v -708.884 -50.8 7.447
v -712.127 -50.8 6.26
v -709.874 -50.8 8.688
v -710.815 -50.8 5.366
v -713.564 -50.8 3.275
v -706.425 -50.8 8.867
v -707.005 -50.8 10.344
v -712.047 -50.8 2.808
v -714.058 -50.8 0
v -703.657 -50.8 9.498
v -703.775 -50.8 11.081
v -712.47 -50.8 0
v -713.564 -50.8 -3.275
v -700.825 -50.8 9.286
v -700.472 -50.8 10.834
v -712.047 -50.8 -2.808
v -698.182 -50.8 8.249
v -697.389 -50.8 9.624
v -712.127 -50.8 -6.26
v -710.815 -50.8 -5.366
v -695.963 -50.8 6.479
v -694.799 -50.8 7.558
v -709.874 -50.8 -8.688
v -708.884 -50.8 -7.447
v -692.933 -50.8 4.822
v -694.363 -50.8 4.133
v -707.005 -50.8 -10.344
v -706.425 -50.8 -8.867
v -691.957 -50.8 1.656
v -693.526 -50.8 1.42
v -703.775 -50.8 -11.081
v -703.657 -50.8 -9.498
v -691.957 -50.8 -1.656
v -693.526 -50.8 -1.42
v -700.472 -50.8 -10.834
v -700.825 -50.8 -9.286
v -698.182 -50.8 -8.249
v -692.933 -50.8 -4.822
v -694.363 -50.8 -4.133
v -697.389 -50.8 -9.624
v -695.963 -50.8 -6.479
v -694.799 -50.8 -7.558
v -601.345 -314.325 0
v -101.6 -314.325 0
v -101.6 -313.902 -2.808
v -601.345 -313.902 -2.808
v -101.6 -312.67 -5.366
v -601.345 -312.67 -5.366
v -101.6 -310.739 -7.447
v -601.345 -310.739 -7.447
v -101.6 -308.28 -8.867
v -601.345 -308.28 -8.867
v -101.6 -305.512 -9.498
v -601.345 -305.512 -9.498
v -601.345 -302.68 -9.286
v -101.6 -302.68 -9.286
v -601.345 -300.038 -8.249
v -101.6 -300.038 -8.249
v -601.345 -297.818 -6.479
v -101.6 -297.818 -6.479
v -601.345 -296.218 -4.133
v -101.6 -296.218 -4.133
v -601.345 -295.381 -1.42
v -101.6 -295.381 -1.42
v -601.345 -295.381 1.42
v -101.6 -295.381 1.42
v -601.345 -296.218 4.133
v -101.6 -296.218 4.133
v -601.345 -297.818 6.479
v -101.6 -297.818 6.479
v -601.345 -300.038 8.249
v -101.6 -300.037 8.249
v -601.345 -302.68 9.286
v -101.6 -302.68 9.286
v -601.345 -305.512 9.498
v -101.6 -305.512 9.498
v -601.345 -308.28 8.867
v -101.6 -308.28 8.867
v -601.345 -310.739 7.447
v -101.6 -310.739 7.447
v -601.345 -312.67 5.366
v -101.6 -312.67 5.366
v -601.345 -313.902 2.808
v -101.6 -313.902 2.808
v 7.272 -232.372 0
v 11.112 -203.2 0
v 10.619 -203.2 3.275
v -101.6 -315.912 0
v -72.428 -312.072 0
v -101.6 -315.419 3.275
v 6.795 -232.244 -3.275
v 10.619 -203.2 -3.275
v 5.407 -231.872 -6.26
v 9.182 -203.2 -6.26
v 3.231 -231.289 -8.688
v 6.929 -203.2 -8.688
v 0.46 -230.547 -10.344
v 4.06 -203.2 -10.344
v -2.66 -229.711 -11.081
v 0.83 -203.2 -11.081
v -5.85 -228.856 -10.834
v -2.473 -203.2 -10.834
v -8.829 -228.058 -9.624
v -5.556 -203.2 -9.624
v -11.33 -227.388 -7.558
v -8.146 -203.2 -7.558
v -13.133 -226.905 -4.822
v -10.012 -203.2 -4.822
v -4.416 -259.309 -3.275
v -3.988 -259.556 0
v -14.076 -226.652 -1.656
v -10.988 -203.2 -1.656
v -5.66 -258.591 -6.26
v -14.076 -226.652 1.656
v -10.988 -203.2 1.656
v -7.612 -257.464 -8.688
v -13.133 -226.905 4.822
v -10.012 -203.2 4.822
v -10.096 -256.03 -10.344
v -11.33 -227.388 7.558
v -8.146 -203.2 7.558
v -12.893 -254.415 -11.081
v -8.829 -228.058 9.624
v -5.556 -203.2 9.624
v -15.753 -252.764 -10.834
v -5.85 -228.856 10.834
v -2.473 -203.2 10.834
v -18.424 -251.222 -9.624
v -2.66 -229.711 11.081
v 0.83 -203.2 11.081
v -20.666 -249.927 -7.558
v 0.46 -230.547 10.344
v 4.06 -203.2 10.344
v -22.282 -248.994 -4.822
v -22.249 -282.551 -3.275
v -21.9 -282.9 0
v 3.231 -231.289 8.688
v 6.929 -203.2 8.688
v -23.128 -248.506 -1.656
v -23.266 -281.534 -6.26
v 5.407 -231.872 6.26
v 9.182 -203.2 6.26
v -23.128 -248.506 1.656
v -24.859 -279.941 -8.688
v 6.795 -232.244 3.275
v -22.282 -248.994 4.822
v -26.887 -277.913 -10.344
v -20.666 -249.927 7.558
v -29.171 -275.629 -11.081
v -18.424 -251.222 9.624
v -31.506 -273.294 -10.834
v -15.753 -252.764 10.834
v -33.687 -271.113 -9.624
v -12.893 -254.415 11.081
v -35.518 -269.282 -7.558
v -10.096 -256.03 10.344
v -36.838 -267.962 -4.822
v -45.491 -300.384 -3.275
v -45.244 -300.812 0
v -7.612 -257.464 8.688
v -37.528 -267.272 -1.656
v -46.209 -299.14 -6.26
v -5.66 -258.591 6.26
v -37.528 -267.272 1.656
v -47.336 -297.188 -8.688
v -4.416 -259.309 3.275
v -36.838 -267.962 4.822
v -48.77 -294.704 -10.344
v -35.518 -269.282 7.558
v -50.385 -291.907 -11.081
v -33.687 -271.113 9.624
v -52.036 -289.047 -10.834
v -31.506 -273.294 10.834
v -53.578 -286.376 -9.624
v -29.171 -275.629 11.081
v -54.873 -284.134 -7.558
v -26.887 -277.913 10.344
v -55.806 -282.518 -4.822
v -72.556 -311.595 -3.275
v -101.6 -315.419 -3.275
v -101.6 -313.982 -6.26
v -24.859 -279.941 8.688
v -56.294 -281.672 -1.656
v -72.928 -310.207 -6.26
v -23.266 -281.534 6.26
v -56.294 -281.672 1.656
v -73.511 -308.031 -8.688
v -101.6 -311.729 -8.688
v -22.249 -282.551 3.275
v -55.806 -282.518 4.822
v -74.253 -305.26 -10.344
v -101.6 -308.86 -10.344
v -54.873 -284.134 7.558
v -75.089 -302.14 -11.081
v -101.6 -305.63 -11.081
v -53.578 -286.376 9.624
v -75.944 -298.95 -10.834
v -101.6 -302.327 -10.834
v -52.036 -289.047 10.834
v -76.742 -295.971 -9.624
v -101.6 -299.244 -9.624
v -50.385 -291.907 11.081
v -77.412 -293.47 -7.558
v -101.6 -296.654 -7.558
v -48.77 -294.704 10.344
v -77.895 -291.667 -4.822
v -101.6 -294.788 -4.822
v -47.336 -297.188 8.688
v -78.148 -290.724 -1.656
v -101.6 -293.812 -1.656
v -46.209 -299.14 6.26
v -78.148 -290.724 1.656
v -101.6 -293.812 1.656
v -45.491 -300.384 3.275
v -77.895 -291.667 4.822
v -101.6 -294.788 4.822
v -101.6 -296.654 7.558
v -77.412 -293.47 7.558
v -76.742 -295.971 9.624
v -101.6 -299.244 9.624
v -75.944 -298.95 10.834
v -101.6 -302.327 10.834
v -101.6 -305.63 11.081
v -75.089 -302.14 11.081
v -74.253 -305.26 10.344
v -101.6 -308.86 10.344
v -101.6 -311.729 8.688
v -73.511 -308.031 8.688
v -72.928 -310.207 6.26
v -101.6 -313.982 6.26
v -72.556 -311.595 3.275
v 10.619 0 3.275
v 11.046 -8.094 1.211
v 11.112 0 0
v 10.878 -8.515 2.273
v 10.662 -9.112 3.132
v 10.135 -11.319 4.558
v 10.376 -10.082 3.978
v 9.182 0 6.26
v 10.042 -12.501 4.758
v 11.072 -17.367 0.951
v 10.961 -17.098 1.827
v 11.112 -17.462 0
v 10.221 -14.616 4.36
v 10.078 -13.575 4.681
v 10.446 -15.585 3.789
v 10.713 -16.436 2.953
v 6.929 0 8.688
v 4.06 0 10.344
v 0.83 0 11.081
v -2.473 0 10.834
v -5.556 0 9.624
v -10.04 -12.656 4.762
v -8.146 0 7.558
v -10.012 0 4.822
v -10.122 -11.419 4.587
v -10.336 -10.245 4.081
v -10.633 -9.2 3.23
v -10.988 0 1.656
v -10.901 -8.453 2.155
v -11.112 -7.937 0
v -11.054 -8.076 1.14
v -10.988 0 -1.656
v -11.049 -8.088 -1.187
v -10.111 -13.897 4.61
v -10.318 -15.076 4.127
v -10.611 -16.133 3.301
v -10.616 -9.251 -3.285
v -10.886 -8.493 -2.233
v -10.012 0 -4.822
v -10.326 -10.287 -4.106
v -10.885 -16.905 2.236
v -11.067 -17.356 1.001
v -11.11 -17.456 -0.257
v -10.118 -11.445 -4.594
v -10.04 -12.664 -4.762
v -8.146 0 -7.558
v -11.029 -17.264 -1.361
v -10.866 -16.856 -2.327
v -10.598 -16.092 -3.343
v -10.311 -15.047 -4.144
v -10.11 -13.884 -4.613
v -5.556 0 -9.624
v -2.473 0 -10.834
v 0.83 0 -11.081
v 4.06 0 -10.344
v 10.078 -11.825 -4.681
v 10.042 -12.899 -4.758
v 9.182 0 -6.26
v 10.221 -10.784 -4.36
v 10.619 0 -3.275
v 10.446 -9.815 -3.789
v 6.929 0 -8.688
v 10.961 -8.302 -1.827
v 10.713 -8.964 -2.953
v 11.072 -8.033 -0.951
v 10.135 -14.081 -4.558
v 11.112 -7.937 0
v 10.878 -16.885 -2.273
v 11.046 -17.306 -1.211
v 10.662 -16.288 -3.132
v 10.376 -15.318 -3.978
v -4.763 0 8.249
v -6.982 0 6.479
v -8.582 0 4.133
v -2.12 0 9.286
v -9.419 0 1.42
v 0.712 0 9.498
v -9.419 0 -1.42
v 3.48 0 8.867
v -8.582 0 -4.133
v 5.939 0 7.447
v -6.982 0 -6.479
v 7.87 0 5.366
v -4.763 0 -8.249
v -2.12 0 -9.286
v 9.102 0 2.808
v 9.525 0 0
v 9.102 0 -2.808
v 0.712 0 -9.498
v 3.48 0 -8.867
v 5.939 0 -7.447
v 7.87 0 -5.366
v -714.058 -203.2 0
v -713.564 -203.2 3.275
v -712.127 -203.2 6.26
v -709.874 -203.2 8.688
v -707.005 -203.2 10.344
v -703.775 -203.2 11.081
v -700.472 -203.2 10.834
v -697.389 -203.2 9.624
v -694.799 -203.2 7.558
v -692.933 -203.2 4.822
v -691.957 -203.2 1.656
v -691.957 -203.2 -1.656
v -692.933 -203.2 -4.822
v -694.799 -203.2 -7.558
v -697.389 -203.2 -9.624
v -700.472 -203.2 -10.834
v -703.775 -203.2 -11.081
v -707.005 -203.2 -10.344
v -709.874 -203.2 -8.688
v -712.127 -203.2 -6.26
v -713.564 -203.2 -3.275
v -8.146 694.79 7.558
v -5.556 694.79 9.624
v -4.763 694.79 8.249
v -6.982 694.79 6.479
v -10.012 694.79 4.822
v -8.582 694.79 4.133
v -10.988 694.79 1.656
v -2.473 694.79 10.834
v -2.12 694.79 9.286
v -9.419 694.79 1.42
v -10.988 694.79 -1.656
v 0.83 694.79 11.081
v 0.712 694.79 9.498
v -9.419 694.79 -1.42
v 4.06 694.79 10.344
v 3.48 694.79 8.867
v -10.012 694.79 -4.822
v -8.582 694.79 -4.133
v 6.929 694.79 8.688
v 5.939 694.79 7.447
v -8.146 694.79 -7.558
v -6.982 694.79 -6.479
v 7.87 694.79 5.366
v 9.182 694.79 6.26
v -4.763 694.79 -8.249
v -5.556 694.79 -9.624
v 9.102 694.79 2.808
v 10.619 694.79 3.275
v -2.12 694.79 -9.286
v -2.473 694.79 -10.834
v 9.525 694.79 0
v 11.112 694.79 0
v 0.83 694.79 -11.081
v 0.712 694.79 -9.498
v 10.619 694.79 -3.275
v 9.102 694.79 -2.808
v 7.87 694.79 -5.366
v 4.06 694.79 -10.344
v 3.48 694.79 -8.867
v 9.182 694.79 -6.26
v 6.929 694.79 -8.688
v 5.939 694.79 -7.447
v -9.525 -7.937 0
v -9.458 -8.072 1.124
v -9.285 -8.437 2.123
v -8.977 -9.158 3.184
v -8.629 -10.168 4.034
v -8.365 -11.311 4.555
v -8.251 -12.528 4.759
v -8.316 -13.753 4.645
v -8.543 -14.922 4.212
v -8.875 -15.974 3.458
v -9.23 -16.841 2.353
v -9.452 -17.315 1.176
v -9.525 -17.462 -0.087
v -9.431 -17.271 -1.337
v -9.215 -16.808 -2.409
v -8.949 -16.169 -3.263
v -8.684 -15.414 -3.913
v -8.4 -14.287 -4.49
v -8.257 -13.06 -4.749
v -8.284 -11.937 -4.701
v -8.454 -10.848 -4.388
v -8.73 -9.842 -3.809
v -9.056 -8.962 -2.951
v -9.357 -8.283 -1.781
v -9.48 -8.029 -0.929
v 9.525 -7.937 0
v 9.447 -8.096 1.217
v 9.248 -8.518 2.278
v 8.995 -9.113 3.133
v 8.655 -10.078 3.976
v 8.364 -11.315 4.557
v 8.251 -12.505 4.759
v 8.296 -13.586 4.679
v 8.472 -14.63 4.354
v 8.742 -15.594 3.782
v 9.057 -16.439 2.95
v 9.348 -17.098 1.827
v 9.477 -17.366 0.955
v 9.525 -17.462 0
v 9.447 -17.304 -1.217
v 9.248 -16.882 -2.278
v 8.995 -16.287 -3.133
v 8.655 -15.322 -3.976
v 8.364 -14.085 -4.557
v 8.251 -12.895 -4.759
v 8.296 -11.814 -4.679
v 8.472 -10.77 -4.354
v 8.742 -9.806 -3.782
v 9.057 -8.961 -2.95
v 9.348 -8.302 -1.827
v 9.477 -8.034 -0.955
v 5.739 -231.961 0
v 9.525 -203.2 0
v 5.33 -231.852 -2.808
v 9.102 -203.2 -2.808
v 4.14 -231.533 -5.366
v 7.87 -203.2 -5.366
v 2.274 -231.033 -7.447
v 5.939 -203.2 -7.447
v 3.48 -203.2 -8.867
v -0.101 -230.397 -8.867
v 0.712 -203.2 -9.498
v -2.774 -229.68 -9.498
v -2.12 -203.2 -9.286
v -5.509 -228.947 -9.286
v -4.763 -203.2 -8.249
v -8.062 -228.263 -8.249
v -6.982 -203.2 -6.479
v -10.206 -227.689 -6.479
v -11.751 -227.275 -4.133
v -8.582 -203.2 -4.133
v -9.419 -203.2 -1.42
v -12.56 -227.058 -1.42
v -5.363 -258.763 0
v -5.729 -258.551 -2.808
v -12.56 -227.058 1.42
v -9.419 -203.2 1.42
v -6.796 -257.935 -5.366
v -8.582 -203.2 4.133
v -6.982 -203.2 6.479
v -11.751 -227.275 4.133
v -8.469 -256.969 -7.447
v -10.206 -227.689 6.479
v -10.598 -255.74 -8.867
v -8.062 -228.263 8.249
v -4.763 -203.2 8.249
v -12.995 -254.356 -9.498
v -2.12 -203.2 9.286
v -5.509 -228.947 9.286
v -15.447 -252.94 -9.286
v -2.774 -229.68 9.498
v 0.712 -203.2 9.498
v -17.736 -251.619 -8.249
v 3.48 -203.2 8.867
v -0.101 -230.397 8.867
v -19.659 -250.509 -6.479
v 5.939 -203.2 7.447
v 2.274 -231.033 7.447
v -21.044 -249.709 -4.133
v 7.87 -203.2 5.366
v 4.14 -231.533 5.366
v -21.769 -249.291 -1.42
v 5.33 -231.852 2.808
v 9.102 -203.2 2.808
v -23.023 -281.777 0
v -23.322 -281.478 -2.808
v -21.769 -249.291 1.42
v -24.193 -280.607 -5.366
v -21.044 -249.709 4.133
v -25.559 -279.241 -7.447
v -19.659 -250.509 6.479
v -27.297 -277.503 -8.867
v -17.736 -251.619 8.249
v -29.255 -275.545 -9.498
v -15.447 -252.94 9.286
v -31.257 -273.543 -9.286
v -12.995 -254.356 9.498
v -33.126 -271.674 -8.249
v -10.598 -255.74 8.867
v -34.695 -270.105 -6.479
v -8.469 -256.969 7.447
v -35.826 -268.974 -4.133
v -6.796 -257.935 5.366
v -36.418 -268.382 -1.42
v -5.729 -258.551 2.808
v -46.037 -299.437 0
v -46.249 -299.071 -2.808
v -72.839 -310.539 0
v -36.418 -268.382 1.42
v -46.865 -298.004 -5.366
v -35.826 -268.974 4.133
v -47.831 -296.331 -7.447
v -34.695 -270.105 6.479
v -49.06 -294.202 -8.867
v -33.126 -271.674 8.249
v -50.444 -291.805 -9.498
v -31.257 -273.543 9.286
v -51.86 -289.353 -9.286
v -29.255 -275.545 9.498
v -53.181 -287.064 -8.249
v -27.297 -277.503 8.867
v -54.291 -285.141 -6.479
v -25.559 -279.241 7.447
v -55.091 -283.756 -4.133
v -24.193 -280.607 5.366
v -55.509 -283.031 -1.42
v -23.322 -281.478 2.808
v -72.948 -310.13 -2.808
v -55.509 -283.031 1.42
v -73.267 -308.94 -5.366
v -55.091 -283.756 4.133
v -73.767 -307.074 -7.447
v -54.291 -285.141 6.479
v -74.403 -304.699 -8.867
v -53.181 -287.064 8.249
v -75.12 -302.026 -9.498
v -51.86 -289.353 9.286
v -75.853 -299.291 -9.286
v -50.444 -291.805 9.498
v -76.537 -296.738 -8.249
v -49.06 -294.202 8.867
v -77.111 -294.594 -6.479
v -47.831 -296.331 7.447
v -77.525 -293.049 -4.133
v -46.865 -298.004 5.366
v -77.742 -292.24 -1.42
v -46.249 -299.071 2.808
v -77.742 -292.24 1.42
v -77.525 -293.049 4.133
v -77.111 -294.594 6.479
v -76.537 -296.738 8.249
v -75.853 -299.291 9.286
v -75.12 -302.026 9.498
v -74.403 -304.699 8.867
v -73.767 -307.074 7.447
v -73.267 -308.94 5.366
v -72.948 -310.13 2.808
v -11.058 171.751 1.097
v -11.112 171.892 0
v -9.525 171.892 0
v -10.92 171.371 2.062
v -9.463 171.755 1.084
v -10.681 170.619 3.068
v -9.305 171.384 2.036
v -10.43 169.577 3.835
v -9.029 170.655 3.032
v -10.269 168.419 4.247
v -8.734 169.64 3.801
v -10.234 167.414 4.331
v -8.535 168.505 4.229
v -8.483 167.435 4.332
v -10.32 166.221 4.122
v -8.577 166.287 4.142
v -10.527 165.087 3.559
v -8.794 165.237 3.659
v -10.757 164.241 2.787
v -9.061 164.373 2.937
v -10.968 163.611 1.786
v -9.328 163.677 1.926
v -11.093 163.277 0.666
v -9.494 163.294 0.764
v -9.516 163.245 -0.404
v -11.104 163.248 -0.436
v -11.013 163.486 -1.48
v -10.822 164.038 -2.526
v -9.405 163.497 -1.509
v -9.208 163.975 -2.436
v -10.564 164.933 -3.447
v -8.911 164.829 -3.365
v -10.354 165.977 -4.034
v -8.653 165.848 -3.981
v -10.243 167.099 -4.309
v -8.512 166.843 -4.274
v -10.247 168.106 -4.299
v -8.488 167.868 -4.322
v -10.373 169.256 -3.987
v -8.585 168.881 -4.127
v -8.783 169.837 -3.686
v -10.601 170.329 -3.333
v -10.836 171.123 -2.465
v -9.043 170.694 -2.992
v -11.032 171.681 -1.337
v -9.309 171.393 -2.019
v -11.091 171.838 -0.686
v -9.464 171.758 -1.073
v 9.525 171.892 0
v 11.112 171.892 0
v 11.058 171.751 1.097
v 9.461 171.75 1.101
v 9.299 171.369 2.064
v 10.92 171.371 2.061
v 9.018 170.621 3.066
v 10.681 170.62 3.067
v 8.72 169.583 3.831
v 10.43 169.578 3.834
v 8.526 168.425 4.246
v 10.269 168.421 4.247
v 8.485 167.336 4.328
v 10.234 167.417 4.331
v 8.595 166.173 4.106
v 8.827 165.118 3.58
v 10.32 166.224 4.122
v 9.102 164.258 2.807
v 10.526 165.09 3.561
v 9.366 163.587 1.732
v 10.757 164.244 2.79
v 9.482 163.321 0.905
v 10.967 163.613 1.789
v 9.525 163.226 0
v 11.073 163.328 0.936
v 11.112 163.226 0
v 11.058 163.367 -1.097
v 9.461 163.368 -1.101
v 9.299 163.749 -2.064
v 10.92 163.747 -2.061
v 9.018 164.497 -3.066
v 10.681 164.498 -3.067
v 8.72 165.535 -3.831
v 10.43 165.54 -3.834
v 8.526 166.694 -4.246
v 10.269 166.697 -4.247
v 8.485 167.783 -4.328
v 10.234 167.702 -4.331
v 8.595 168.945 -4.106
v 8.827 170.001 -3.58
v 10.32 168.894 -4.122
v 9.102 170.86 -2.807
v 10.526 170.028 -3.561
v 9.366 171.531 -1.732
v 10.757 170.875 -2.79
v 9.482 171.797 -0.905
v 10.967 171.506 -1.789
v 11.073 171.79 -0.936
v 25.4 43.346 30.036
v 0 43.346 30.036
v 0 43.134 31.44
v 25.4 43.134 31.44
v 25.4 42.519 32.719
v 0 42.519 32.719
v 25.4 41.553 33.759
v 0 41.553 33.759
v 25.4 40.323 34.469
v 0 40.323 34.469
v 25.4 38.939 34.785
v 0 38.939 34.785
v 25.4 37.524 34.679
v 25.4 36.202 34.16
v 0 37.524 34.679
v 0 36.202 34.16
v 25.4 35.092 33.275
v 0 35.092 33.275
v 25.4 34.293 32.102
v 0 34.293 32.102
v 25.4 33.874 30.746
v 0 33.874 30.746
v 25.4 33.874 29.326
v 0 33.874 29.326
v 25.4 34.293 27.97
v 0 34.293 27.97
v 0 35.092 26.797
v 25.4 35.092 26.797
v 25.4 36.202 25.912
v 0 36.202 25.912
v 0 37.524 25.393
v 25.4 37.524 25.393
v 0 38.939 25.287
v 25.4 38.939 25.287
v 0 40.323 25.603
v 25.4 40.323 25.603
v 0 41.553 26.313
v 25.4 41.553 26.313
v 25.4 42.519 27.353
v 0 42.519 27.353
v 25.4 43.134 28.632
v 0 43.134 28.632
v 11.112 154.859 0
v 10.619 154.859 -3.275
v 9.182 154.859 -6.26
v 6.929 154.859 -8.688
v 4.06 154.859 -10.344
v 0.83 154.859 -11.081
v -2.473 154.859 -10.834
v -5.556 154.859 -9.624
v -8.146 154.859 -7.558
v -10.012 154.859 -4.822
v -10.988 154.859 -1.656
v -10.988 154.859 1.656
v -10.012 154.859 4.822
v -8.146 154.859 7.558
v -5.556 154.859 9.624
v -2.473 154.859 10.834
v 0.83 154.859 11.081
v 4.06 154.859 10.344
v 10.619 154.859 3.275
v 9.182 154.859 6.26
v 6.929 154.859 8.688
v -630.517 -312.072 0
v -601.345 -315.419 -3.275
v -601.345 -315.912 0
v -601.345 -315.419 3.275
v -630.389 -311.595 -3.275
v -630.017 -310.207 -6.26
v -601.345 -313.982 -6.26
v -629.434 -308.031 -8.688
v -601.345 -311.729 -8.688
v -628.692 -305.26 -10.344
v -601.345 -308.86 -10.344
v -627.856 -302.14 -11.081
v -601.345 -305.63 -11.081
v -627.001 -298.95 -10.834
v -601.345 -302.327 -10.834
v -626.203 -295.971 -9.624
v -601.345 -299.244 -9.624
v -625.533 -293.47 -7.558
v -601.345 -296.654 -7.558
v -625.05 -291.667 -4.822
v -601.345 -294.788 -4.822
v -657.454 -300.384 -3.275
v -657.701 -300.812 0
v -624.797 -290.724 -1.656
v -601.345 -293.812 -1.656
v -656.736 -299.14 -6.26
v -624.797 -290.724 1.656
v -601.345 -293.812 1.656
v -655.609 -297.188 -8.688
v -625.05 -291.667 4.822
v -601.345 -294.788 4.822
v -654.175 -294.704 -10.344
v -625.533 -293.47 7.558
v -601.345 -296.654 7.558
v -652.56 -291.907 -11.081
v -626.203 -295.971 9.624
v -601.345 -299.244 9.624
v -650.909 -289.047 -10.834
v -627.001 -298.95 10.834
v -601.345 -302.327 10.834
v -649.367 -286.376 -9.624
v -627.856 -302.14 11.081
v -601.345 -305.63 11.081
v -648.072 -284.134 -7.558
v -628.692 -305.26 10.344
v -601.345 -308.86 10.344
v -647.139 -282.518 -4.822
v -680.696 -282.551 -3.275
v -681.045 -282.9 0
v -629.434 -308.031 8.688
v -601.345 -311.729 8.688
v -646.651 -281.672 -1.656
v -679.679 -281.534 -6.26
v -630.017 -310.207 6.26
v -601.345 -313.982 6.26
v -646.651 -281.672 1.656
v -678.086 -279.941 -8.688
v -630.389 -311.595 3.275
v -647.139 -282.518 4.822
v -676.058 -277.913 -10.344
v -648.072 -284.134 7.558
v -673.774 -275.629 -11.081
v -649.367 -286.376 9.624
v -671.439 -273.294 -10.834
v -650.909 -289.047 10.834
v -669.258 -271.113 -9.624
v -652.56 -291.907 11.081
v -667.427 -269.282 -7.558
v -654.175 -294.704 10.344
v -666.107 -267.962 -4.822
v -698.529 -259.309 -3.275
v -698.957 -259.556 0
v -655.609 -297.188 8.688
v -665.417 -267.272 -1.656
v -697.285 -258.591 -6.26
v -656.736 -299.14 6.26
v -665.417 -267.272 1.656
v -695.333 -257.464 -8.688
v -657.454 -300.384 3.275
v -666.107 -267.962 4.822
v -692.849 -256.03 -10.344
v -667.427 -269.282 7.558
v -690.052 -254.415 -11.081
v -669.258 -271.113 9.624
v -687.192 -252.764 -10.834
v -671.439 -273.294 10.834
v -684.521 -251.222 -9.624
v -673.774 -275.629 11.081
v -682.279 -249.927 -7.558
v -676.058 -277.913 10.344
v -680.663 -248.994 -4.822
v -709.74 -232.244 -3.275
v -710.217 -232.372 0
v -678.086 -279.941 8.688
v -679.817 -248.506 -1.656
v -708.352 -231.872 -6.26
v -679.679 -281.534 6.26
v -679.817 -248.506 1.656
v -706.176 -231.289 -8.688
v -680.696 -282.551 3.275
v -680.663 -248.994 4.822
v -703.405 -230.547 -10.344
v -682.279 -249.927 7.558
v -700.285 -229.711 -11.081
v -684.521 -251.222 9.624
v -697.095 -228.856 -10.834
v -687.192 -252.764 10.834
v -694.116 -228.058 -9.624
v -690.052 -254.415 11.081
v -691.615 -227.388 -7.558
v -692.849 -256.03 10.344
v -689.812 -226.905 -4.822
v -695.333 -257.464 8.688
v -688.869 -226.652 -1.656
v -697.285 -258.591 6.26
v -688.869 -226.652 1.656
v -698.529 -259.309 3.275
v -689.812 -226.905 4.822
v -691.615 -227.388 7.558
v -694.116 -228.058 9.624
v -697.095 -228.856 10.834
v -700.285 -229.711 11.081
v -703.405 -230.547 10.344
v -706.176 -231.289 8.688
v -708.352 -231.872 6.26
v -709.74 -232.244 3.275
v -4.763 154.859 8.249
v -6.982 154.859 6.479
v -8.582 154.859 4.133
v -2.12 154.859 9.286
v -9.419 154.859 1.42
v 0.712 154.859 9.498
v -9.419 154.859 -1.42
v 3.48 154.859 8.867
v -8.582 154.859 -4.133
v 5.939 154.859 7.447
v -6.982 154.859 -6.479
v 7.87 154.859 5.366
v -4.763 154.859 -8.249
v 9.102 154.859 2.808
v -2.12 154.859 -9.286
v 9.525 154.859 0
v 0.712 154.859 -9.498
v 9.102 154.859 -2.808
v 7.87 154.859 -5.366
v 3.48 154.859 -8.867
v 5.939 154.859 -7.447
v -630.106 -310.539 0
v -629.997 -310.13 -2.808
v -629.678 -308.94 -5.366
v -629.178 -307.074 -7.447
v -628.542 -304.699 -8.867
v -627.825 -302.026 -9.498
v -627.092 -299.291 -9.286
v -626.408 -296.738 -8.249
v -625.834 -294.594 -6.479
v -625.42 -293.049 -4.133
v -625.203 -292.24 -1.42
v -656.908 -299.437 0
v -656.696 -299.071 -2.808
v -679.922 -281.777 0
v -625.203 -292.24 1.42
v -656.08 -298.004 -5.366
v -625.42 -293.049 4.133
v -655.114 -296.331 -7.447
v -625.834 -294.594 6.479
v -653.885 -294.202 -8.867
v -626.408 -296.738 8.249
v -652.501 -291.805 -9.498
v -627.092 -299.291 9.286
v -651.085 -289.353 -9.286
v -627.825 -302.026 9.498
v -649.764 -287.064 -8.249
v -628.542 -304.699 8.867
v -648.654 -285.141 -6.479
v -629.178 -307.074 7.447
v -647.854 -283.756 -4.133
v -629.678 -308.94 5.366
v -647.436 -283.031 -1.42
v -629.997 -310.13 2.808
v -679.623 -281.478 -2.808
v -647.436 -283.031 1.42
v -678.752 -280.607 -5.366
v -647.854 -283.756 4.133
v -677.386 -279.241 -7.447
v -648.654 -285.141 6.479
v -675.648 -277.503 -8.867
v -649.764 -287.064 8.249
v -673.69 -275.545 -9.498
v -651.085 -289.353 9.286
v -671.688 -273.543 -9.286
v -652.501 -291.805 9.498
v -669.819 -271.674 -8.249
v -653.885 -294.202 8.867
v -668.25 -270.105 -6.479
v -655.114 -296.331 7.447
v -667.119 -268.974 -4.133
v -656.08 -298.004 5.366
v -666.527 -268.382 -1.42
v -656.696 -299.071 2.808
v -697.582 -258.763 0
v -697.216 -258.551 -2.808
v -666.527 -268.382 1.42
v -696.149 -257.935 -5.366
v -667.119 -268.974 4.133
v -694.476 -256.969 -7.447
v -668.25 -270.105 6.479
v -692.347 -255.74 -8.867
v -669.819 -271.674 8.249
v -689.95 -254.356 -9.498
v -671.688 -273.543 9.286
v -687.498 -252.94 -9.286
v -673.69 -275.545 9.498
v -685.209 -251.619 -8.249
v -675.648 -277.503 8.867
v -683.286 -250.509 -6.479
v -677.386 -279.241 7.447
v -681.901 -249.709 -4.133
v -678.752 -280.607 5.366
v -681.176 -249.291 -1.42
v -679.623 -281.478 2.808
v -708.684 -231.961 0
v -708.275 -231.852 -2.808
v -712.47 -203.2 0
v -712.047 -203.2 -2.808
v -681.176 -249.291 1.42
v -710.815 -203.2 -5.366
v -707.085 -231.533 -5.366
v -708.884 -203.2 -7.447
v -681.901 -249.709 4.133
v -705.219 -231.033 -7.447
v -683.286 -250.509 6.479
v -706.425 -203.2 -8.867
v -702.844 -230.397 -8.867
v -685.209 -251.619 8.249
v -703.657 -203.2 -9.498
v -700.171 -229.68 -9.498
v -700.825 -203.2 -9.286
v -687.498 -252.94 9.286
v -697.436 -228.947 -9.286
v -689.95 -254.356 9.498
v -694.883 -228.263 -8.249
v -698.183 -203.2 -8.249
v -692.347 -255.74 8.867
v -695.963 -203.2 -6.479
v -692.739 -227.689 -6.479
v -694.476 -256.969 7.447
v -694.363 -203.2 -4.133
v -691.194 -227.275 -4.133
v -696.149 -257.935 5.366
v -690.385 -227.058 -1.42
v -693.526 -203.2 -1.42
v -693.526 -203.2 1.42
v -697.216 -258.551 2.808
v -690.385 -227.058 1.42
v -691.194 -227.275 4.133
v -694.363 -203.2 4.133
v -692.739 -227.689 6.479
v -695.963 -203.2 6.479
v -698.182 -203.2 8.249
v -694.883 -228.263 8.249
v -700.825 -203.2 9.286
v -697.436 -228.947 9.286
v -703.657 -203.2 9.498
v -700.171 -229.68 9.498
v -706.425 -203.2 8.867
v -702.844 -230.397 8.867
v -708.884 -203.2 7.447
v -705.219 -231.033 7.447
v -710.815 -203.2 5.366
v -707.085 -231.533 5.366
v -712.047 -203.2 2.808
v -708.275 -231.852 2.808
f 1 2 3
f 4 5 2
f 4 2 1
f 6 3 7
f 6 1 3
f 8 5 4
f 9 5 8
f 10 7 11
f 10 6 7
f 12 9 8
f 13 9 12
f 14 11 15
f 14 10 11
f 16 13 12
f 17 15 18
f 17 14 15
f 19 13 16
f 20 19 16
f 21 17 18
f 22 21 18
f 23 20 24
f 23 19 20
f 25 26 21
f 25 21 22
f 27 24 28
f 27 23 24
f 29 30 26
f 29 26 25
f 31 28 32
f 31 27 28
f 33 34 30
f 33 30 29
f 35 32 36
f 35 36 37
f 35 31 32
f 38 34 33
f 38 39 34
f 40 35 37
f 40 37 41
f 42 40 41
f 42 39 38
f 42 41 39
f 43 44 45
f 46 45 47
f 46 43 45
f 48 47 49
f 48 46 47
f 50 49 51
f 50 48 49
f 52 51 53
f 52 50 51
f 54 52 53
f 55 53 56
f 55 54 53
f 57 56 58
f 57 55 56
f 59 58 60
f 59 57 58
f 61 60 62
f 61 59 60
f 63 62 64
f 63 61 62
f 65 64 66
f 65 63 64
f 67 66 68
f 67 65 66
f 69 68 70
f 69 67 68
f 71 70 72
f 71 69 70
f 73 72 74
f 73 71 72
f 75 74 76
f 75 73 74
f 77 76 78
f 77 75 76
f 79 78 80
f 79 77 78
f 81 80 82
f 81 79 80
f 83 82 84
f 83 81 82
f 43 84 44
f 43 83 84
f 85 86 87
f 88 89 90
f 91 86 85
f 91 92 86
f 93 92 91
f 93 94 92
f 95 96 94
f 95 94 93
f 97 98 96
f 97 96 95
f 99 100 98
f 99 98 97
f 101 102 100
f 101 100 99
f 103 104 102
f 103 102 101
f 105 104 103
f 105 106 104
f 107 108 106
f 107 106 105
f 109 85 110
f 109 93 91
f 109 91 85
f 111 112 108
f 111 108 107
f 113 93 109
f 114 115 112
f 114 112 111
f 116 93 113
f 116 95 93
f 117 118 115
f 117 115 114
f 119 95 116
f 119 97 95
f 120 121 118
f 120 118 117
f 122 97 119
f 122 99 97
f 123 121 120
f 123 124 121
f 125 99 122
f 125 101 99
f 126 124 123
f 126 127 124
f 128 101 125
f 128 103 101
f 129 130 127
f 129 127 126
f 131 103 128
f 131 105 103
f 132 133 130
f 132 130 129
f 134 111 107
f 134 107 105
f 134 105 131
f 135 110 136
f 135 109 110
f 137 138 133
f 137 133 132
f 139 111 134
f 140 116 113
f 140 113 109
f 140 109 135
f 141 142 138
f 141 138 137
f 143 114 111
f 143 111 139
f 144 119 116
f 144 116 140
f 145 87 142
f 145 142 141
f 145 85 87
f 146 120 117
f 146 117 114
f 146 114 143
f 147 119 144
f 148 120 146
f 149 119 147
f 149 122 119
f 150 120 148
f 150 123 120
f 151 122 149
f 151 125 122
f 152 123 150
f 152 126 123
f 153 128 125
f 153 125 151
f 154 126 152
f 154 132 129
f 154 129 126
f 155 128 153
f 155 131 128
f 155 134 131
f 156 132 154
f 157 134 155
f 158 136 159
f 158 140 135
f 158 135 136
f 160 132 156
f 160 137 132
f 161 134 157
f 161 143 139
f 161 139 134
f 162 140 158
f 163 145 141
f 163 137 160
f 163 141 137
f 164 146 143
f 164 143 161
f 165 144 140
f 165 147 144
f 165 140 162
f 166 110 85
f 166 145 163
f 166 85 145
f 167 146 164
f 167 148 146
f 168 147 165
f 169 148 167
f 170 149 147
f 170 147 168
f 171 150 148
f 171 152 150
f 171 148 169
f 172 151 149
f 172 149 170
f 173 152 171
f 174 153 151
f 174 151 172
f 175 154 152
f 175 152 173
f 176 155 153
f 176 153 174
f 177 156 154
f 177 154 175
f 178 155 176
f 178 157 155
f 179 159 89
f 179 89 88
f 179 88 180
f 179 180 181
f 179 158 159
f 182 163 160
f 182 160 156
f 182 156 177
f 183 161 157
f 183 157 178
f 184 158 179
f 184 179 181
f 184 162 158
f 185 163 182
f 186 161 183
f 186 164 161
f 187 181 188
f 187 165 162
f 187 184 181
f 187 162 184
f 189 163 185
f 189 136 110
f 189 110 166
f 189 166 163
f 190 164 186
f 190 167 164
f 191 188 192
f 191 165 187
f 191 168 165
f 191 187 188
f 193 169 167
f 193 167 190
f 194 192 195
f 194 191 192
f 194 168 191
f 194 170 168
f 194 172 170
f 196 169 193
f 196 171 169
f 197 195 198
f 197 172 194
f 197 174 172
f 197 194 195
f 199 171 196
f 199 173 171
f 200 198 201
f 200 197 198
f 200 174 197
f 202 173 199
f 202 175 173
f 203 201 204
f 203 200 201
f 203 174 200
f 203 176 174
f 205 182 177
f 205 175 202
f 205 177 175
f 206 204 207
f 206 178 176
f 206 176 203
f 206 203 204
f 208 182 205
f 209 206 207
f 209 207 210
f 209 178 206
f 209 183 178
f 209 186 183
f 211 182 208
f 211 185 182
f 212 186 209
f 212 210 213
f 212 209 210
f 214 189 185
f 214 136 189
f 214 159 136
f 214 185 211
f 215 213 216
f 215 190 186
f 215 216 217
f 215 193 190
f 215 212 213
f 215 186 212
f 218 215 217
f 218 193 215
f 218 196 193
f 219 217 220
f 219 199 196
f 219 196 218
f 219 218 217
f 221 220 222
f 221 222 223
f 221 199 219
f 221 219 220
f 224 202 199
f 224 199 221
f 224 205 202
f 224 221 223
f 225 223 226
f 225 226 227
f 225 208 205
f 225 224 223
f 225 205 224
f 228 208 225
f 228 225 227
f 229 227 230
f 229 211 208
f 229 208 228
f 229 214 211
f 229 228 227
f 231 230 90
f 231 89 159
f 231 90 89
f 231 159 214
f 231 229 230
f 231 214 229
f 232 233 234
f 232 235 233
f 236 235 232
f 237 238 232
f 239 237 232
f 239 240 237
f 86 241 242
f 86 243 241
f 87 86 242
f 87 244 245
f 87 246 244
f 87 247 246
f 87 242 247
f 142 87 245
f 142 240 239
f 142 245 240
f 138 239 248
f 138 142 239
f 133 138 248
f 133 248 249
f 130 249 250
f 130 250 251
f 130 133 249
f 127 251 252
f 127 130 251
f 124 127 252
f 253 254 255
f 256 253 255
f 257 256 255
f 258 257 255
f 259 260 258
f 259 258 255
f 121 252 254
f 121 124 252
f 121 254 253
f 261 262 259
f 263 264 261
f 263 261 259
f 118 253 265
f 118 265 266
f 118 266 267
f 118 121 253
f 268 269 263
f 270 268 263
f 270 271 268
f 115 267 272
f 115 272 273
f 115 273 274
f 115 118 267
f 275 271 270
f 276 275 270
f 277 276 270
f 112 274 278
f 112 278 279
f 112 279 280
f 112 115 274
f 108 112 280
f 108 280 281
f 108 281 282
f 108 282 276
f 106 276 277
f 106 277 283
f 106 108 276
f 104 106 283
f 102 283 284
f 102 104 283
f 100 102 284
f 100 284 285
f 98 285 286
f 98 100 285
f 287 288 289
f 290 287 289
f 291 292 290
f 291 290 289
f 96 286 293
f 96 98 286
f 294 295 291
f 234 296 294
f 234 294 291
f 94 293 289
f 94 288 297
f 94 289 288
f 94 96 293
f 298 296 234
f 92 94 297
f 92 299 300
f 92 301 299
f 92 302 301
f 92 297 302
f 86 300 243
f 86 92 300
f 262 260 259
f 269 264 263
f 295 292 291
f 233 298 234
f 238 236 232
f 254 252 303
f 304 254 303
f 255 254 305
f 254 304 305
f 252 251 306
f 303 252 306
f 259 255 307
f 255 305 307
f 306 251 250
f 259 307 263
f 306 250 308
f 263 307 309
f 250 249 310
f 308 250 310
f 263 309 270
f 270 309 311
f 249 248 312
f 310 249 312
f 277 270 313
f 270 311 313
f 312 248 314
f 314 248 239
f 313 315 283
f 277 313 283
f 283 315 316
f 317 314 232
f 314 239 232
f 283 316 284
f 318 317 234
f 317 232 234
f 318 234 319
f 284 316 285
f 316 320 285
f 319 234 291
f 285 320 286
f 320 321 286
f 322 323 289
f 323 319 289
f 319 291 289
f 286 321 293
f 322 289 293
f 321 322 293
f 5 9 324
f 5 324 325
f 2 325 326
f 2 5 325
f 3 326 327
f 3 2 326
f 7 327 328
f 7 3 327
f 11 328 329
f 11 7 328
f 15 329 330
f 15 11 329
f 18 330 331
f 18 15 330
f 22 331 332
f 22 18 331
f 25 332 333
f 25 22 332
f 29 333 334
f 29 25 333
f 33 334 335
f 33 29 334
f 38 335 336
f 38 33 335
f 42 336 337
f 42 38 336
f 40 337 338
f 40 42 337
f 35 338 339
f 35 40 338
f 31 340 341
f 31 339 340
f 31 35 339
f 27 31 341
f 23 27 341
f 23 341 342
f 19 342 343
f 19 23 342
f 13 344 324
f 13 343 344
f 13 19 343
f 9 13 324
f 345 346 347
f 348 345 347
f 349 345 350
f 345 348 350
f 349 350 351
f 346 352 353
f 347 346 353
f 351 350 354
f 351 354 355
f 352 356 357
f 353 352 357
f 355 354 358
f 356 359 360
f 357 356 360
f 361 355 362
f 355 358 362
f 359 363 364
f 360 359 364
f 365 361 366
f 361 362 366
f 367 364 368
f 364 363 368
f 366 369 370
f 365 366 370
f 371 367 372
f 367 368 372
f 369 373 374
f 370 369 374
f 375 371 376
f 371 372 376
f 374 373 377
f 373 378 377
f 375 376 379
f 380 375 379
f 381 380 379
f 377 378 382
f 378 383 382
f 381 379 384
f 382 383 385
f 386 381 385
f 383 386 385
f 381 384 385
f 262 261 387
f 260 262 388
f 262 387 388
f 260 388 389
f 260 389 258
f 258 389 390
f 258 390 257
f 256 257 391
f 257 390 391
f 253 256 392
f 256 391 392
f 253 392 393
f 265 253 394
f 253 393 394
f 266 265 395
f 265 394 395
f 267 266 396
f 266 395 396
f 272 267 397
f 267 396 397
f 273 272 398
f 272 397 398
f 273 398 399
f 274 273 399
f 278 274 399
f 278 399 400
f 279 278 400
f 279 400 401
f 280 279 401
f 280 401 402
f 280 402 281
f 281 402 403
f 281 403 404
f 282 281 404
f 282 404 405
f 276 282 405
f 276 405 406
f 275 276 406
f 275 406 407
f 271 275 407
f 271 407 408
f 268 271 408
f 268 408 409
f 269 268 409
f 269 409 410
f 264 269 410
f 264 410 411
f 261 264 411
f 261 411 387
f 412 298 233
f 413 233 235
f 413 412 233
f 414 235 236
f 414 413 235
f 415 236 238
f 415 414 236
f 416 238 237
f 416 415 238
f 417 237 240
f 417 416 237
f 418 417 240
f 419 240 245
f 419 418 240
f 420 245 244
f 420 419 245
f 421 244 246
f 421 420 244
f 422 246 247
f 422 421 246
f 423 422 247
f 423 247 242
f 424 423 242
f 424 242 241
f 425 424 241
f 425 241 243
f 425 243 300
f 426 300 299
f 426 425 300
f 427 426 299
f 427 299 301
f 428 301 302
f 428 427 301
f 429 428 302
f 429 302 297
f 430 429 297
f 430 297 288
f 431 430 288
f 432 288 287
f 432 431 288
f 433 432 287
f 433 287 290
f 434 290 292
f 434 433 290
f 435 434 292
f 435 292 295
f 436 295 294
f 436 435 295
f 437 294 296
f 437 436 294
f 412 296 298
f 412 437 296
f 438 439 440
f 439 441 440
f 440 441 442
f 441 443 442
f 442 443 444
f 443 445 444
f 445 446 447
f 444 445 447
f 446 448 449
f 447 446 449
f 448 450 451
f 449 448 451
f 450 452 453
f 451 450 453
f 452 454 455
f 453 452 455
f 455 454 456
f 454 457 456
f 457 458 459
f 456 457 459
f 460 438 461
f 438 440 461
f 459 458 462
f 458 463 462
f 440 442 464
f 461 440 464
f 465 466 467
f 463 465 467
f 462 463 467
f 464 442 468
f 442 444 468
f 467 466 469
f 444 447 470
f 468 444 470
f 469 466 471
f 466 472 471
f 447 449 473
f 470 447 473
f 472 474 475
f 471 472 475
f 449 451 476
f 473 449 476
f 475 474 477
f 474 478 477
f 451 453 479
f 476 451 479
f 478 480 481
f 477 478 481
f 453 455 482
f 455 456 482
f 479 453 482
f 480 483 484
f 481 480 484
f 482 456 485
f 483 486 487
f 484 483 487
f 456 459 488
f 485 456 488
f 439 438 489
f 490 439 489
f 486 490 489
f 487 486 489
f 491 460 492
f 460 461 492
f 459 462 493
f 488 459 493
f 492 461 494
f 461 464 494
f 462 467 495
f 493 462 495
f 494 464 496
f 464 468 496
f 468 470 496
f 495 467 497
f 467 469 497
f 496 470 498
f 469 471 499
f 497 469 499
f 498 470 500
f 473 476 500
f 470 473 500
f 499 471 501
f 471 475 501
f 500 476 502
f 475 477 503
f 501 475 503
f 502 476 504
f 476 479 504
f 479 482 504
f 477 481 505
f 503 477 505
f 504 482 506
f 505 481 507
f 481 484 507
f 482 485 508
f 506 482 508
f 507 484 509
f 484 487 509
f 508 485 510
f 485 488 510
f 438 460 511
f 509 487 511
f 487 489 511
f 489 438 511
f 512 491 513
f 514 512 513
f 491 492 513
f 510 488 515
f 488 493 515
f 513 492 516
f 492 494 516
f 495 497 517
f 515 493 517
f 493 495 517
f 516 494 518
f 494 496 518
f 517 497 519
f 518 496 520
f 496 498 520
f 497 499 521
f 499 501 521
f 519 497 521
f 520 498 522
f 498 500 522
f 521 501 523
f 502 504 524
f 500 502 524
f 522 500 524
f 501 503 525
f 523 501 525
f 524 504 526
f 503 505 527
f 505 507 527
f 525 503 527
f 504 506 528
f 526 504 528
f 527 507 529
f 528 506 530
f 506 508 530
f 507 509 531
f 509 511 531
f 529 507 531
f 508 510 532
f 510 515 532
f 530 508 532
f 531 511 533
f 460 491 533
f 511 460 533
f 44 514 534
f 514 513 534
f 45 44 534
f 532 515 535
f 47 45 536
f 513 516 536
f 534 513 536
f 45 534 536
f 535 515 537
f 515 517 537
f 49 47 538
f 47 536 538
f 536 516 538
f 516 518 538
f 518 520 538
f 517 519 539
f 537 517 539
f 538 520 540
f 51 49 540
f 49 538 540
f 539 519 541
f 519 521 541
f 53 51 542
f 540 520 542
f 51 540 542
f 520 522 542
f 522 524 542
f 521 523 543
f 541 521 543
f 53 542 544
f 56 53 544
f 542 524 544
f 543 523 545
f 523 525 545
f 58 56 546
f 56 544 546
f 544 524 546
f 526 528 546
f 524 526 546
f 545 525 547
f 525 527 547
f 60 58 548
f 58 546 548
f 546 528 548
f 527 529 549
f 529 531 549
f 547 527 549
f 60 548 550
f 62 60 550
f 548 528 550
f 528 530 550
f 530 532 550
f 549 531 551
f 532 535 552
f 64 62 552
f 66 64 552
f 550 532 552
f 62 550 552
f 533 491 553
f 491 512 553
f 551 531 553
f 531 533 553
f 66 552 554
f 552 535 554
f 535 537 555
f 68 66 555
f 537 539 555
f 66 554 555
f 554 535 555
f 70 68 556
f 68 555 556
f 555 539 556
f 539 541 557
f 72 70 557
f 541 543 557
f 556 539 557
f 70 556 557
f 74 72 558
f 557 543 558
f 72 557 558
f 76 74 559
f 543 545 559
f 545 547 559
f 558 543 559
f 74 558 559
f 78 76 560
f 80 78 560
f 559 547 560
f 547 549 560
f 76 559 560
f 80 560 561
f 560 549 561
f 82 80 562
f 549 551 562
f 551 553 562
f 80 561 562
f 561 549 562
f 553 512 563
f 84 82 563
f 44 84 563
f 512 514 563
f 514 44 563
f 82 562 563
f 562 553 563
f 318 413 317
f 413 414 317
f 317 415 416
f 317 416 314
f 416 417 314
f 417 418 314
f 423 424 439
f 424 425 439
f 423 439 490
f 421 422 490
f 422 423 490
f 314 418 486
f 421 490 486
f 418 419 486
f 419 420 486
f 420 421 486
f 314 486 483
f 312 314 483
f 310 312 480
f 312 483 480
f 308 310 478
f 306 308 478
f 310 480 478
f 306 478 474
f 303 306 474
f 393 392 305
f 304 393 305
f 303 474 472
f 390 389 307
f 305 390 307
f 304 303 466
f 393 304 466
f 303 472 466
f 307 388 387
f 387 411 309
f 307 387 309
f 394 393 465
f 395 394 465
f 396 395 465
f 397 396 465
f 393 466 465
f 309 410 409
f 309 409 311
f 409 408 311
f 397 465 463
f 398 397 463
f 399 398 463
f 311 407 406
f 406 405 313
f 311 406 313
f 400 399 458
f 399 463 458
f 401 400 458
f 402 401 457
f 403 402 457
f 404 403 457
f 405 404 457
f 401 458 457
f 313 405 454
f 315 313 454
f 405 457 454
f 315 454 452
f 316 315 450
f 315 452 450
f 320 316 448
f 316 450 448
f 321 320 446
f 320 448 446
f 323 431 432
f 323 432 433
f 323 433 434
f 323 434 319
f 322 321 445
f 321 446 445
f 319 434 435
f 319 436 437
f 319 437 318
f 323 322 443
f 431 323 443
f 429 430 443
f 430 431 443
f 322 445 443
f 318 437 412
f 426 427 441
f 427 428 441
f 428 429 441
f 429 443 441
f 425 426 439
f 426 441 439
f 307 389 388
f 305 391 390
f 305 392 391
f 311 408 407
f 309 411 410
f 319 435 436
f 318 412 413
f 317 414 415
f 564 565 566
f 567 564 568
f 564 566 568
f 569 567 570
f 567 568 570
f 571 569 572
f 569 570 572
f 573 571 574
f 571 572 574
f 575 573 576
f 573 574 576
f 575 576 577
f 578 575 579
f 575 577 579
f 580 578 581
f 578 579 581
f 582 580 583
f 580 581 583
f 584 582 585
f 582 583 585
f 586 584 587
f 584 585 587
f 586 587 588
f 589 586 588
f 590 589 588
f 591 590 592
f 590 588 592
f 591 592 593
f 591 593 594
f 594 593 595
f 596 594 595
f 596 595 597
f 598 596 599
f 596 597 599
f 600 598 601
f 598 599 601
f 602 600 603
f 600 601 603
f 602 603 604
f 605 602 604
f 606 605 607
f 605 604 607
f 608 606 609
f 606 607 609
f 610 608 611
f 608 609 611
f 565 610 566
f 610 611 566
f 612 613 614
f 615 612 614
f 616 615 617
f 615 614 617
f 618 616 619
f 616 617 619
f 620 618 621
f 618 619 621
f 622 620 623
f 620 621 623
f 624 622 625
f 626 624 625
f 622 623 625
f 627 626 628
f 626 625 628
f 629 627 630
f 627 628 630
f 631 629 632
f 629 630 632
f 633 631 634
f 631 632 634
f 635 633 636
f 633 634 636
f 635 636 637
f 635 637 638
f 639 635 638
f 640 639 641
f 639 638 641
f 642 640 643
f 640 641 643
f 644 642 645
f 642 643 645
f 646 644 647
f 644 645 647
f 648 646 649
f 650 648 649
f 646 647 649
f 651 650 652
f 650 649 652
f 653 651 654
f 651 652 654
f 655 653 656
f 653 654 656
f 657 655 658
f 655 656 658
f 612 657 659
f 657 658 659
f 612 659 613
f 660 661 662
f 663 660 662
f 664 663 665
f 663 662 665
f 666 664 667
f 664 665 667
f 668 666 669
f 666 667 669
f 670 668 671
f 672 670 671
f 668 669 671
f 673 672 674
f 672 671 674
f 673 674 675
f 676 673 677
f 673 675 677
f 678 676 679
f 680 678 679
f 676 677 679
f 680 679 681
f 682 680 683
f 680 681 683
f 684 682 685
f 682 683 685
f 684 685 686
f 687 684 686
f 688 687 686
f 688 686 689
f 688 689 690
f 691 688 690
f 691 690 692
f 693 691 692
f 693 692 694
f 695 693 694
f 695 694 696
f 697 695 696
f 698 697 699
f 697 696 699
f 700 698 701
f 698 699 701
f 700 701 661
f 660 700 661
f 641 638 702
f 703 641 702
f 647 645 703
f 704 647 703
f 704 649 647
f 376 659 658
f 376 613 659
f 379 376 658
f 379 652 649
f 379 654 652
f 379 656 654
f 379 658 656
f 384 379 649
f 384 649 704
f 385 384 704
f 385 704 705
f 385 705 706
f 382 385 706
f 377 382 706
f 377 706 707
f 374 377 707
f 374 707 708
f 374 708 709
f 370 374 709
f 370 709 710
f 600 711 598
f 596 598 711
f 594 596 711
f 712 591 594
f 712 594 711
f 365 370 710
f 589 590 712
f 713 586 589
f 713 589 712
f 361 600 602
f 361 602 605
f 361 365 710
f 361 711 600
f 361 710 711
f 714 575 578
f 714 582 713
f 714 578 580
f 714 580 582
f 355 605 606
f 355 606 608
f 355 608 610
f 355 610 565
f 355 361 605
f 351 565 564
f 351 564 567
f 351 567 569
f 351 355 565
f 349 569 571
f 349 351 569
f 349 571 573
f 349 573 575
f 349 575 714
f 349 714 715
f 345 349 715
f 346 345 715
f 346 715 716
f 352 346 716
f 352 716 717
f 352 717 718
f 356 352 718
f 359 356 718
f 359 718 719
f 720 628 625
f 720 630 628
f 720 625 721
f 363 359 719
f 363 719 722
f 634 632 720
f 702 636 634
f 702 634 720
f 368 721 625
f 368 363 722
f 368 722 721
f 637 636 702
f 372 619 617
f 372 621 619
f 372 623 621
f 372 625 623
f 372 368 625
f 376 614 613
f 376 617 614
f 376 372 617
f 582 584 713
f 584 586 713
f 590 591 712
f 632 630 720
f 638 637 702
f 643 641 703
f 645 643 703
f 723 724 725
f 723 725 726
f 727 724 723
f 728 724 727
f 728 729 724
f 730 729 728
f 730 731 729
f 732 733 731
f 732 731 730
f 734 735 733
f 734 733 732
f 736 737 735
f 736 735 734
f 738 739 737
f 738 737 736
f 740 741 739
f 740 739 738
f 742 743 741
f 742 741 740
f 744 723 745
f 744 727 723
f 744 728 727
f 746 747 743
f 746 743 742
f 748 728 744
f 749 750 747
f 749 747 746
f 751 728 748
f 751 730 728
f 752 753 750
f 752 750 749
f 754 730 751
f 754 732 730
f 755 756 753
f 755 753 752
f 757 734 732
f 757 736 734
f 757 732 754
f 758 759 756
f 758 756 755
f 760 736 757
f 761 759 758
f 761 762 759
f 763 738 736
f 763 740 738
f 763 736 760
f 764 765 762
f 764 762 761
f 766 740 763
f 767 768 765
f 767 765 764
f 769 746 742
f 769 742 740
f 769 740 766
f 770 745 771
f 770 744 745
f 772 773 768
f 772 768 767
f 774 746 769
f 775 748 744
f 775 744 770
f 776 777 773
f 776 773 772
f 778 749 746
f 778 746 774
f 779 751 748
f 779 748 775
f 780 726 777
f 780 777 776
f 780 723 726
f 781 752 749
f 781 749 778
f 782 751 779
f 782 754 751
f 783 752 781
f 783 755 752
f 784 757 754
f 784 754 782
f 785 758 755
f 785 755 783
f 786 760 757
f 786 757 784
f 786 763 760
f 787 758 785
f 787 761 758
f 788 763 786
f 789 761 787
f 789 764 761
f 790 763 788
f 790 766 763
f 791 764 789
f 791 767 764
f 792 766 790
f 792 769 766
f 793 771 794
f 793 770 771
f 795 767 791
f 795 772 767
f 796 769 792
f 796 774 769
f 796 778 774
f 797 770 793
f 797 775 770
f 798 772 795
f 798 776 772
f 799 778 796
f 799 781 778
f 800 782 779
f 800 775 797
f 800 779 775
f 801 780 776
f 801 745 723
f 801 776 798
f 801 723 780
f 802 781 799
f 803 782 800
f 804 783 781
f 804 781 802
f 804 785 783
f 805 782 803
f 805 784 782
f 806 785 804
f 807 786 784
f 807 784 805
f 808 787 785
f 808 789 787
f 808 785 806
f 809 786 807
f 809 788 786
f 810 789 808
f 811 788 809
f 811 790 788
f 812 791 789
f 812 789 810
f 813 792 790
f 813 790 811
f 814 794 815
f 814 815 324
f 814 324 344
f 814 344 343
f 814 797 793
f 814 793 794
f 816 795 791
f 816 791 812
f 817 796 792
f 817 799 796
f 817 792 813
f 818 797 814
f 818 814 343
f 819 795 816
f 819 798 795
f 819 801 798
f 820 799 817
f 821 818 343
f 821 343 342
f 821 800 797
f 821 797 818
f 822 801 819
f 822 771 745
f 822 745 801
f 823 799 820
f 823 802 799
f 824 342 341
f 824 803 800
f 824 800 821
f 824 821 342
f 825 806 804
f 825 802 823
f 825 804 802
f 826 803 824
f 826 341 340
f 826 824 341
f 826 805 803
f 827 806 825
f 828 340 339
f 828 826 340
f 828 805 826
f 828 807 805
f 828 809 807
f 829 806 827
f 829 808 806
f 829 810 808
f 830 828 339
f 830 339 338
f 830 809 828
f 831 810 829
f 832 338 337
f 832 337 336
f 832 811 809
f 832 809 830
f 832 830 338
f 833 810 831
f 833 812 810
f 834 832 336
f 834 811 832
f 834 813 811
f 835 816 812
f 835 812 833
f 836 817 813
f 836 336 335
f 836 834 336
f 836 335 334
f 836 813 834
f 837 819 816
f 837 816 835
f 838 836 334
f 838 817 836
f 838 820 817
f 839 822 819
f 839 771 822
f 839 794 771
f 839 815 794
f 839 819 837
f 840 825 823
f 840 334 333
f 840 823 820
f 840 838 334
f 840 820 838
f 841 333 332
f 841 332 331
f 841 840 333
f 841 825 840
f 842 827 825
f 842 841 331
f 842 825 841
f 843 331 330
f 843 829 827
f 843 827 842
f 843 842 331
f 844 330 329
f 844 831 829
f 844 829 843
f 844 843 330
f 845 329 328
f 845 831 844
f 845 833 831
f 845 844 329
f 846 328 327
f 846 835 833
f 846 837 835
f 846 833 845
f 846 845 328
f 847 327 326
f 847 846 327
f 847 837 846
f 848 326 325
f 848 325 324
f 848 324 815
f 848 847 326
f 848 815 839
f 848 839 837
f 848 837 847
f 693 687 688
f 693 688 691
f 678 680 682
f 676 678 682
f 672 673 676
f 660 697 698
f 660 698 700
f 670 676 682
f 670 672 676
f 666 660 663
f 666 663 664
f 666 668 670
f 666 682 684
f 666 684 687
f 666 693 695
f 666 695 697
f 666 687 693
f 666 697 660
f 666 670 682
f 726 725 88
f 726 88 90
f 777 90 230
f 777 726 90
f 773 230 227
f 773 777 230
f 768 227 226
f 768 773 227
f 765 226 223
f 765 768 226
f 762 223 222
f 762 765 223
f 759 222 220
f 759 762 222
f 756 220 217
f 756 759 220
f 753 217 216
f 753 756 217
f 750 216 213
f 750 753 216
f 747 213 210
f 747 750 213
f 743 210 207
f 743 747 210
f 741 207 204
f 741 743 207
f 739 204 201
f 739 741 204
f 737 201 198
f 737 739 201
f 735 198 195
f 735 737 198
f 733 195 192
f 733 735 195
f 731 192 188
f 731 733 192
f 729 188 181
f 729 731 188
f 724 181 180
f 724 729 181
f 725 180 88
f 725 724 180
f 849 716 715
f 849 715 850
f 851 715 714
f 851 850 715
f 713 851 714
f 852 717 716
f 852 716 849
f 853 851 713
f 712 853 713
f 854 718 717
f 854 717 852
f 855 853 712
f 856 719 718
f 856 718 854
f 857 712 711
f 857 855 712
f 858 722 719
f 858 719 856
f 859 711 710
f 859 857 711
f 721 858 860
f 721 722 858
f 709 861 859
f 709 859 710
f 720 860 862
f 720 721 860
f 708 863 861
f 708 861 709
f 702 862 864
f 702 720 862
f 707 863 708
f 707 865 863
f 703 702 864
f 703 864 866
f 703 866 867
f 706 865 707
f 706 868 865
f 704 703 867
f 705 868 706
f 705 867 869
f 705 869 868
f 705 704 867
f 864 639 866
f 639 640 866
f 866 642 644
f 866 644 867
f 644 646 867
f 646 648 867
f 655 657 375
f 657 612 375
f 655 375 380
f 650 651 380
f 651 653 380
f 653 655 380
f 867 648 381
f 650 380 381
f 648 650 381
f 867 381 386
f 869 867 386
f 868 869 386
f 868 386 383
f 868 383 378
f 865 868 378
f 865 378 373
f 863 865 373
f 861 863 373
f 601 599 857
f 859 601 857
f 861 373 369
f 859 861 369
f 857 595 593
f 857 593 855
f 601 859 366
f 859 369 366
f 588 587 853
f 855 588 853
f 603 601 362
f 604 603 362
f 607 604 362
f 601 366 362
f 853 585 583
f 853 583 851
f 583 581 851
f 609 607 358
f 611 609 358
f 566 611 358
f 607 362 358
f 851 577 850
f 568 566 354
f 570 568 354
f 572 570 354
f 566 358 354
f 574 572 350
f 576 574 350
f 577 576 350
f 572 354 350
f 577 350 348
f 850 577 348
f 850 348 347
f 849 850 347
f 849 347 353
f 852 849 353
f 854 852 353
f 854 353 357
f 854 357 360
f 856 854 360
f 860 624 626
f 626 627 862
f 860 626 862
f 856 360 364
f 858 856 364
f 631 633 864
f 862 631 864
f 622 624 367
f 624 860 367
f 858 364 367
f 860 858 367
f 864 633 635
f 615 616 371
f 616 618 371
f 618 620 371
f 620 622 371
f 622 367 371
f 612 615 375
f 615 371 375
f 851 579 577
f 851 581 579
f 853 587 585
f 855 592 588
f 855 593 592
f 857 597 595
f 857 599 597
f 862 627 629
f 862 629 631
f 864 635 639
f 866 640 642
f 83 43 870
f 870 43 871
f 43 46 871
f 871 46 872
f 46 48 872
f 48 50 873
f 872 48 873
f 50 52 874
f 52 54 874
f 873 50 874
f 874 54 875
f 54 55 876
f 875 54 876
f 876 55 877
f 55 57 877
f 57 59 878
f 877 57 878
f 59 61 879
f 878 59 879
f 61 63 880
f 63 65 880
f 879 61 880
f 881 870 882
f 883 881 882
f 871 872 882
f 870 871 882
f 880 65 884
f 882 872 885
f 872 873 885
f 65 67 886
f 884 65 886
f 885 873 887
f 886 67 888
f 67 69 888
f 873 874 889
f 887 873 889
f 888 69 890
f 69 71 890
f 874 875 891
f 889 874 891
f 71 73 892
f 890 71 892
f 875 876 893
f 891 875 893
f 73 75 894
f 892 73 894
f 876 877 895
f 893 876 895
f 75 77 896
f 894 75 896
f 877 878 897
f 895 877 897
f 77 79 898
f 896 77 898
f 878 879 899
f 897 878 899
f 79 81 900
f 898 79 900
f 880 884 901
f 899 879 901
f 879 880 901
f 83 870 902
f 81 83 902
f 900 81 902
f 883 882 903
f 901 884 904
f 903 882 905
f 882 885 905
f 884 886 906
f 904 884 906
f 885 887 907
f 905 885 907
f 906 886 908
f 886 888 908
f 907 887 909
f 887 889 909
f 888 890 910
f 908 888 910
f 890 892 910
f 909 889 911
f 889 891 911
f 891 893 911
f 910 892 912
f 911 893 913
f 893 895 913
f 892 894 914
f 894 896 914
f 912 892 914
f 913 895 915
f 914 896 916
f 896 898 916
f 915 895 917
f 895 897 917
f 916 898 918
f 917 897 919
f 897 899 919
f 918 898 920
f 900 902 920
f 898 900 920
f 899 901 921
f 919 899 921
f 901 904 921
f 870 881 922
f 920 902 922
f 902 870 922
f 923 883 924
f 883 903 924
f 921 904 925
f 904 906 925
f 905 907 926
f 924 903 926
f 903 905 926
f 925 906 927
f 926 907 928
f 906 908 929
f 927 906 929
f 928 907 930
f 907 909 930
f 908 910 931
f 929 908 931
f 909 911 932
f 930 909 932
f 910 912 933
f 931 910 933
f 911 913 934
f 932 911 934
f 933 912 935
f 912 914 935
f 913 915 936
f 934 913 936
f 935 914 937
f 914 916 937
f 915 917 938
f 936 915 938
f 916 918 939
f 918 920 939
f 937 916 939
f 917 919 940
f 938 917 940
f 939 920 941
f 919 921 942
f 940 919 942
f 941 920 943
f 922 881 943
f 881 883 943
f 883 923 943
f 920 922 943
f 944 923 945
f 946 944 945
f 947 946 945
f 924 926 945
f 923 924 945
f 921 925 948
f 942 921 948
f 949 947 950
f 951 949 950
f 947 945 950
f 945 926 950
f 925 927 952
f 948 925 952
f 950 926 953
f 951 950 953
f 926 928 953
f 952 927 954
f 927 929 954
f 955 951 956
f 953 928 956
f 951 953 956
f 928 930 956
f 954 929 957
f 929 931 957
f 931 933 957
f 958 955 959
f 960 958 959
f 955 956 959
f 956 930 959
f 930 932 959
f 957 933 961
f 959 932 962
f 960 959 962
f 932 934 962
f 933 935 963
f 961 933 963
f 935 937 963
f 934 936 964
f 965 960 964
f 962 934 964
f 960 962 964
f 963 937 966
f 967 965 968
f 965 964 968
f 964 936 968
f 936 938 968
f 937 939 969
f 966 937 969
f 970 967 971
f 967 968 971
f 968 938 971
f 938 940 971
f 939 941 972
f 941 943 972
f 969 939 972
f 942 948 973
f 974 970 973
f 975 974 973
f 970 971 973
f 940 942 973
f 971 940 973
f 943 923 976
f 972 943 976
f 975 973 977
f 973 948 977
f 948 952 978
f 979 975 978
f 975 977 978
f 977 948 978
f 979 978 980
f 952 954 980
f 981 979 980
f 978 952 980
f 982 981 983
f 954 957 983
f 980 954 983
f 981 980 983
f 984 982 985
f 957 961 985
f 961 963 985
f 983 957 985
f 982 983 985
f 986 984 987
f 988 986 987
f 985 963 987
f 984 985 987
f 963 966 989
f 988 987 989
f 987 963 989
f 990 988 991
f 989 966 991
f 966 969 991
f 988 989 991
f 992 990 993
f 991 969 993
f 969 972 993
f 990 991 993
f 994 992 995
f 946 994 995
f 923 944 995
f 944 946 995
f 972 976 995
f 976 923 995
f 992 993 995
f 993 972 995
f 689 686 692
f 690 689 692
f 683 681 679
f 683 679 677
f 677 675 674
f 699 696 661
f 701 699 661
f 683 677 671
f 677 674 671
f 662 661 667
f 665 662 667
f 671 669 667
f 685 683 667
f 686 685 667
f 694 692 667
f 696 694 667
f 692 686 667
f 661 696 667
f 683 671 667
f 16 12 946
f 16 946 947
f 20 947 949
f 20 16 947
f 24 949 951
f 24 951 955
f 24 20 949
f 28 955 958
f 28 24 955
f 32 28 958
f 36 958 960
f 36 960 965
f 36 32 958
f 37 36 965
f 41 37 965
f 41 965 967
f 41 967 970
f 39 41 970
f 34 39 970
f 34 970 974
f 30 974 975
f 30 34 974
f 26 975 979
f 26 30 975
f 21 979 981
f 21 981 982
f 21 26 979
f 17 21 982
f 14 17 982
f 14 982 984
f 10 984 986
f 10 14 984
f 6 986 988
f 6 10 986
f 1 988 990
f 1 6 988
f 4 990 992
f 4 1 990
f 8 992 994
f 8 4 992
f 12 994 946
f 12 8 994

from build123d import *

# Parameters (mm, degrees)
F1_R      = 11.1125
F1_R_2    = 9.525
F5_R      = 11.1125
F5_R_2    = 9.525
F7_R      = 4.7625
F7_R_2    = 4.333305
F8_DEPTH  = 12.7
F9_R      = 4.7625
F10_DEPTH = 25.4


with BuildPart() as f2:
    # F2: sweep along a path in F0
    with BuildLine(Plane.XY) as f2_path:
        Line((0, 0), (0, -203.2))
        ThreePointArc((0, -203.2), (-29.757951, -275.042049), (-101.6, -304.8))
        Line((-101.6, -304.8), (-601.345, -304.8))
        ThreePointArc((-601.345, -304.8), (-673.187049, -275.042049), (-702.945, -203.2))
        Line((-702.945, -203.2), (-702.945, -50.8))
    # F1 (on Front) → F2 (sweep)
    with BuildSketch(Plane.XZ):
        Circle(F1_R)
        Circle(F1_R_2, mode=Mode.SUBTRACT)
    sweep(path=f2_path.line)


with BuildPart() as f6:
    # F6: sweep along a path in F3
    with BuildLine(Plane.XY) as f6_path:
        Line((0, 154.859155), (0, 694.789588))
    # F5 (on plane+point) → F6 (sweep)
    with BuildSketch(Plane.XZ.offset(-154.859155)):
        Circle(F5_R)
        Circle(F5_R_2, mode=Mode.SUBTRACT)
    sweep(path=f6_path.line)


with BuildPart() as f8_tool:
    # F7 (on Right) → F8 (new body, symmetric)
    with BuildSketch(Plane.YZ):
        with Locations((-12.7, 0)):
            Circle(F7_R)
        with Locations((167.559155, 0)):
            Circle(F7_R_2)
    extrude(amount=F8_DEPTH, both=True)


with BuildPart() as f2_1:
    add(f2.part)

    # F8: cut by f8_tool
    add(f8_tool.part, mode=Mode.SUBTRACT)


with BuildPart() as f6_1:
    add(f6.part)

    # F8: cut by f8_tool
    add(f8_tool.part, mode=Mode.SUBTRACT)


with BuildPart() as f10:
    # F9 (on Right) → F10 (new body)
    with BuildSketch(Plane.YZ):
        with Locations((38.583543, 30.035984)):
            Circle(F9_R)
    extrude(amount=F10_DEPTH)


solid = Compound([f2_1.part, f6_1.part, f10.part])
